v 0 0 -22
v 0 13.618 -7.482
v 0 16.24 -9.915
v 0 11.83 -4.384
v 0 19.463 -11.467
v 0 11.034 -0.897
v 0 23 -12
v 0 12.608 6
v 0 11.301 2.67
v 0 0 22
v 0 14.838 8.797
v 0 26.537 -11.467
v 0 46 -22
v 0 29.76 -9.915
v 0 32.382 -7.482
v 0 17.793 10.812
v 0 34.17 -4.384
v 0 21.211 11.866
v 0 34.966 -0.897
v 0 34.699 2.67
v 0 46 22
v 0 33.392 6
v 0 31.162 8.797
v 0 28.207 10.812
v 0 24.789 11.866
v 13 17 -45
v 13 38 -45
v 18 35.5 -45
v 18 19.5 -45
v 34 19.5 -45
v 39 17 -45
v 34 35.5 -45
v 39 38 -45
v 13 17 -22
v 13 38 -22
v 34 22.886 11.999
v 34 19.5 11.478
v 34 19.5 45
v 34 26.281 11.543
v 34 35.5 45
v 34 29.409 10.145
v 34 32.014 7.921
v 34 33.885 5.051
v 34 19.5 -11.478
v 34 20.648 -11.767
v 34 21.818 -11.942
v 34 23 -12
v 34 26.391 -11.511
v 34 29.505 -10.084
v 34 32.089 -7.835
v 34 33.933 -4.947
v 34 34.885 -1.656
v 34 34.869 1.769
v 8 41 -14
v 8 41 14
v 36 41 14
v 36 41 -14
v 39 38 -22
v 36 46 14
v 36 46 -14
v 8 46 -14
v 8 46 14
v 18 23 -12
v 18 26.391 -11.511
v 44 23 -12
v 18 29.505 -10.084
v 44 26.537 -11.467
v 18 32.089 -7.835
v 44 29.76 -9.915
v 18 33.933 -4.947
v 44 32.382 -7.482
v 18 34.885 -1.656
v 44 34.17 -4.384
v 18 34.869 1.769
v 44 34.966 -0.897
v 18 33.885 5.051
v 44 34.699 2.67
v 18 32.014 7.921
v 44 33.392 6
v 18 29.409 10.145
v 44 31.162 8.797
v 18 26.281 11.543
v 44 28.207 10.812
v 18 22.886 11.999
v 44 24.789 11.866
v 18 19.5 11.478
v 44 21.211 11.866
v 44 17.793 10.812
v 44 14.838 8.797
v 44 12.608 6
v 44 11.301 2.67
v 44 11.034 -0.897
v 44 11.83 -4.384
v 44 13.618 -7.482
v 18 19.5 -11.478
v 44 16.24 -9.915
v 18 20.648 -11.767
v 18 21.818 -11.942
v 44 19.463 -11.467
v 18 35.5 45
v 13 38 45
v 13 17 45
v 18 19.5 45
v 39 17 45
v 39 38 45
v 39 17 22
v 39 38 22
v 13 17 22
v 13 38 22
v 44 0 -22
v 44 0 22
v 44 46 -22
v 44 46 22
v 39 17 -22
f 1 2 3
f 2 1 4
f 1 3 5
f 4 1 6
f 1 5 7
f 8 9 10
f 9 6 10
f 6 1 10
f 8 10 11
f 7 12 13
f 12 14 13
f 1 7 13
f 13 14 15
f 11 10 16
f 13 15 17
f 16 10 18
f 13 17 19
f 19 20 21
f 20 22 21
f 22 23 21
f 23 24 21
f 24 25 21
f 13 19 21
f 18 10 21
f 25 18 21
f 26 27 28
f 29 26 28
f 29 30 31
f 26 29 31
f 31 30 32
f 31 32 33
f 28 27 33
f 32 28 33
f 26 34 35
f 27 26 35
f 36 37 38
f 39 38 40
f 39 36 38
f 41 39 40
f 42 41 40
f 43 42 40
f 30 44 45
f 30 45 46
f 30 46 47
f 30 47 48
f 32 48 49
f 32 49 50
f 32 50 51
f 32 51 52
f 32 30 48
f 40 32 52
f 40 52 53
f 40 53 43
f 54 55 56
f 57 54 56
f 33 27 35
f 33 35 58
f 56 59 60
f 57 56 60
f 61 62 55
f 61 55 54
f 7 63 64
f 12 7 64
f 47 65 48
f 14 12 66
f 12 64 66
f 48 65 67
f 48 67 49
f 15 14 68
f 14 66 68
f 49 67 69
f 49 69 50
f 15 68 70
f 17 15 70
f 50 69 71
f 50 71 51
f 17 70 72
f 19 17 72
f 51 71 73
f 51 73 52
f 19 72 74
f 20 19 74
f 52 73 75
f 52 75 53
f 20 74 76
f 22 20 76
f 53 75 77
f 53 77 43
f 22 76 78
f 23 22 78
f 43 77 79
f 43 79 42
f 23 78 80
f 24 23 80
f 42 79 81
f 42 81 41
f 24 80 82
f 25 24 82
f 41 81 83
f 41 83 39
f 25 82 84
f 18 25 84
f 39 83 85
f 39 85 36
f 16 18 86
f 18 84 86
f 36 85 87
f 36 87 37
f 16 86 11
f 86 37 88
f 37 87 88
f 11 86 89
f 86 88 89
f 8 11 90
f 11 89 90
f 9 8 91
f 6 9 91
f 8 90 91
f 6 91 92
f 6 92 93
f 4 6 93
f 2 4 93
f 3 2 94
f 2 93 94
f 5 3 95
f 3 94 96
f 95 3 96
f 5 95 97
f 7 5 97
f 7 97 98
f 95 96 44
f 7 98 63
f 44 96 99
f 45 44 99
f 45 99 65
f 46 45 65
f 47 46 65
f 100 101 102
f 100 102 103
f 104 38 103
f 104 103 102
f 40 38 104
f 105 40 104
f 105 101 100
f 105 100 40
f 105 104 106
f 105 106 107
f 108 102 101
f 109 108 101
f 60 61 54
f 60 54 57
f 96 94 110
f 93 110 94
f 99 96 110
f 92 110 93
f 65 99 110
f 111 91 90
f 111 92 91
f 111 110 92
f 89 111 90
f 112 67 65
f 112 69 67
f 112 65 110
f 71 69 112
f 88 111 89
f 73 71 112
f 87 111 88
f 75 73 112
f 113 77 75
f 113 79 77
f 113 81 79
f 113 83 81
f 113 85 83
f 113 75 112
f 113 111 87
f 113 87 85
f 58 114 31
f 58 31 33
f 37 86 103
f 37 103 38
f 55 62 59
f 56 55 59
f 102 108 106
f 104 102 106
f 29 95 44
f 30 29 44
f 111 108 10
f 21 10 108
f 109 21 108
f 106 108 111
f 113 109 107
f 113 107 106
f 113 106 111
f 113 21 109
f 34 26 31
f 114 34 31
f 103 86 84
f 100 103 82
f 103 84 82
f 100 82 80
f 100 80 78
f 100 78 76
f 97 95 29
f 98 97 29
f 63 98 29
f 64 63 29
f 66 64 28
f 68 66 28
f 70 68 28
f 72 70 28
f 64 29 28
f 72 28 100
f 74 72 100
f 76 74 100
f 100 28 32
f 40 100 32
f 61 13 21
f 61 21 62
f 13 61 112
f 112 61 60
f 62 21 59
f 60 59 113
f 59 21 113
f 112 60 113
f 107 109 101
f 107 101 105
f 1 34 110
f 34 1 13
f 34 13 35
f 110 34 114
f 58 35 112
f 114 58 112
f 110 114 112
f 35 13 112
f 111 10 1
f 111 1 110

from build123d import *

# Parameters (mm, degrees)
SKETCH1_W                = 44
SKETCH1_H                = 46
BOSS_EXTRUDE1_DEPTH      = 22
BOSS_EXTRUDE3_DEPTH      = 23
BOSS_EXTRUDE3_DEPTH_BACK = 67
SKETCH4_W                = 26
SKETCH4_H                = 21
CUT_EXTRUDE1_DEPTH       = 111.236110236
CUT_EXTRUDE1_DEPTH_BACK  = 111.236110236
SKETCH5_W                = 16
SKETCH5_H                = 16
SKETCH6_R                = 12
CUT_EXTRUDE2_DEPTH       = 44
SKETCH7_W                = 28
SKETCH7_H                = 28
CUT_EXTRUDE3_DEPTH       = 5


with BuildPart() as part:
    # Sketch1 → Boss-Extrude1 (new, symmetric)
    with BuildSketch(Plane.XY):
        with Locations((22, 23)):
            Rectangle(SKETCH1_W, SKETCH1_H)
    extrude(amount=BOSS_EXTRUDE1_DEPTH, both=True)

    # Sketch4 → Boss-Extrude3 (add, two sides: drawn at the far end of the back side and taken through both)
    with BuildSketch(Plane.XY.offset(22).offset(-BOSS_EXTRUDE3_DEPTH_BACK)):
        with Locations((26, 27.5)):
            Rectangle(SKETCH4_W, SKETCH4_H)
    extrude(amount=BOSS_EXTRUDE3_DEPTH + BOSS_EXTRUDE3_DEPTH_BACK)

    # Sketch5 → Cut-Extrude1 (cut, two sides: drawn at the far end of the back side and taken through both)
    with BuildSketch(Plane.XY.offset(45).offset(-CUT_EXTRUDE1_DEPTH_BACK)):
        with Locations((26, 27.5)):
            Rectangle(SKETCH5_W, SKETCH5_H)
    extrude(amount=CUT_EXTRUDE1_DEPTH + CUT_EXTRUDE1_DEPTH_BACK, mode=Mode.SUBTRACT)

    # Sketch6 → Cut-Extrude2 (cut)
    with BuildSketch(Plane(origin=(44, 0, 0), x_dir=(0, 0, -1), z_dir=(1, 0, 0))):
        with Locations((0, 23)):
            Circle(SKETCH6_R)
    extrude(amount=-CUT_EXTRUDE2_DEPTH, mode=Mode.SUBTRACT)

    # Sketch7 → Cut-Extrude3 (cut)
    with BuildSketch(Plane(origin=(0, 46, 0), x_dir=(1, 0, 0), z_dir=(0, 1, 0))):
        with Locations((22, 0)):
            Rectangle(SKETCH7_W, SKETCH7_H)
    extrude(amount=-CUT_EXTRUDE3_DEPTH, mode=Mode.SUBTRACT)


solid = part.part
